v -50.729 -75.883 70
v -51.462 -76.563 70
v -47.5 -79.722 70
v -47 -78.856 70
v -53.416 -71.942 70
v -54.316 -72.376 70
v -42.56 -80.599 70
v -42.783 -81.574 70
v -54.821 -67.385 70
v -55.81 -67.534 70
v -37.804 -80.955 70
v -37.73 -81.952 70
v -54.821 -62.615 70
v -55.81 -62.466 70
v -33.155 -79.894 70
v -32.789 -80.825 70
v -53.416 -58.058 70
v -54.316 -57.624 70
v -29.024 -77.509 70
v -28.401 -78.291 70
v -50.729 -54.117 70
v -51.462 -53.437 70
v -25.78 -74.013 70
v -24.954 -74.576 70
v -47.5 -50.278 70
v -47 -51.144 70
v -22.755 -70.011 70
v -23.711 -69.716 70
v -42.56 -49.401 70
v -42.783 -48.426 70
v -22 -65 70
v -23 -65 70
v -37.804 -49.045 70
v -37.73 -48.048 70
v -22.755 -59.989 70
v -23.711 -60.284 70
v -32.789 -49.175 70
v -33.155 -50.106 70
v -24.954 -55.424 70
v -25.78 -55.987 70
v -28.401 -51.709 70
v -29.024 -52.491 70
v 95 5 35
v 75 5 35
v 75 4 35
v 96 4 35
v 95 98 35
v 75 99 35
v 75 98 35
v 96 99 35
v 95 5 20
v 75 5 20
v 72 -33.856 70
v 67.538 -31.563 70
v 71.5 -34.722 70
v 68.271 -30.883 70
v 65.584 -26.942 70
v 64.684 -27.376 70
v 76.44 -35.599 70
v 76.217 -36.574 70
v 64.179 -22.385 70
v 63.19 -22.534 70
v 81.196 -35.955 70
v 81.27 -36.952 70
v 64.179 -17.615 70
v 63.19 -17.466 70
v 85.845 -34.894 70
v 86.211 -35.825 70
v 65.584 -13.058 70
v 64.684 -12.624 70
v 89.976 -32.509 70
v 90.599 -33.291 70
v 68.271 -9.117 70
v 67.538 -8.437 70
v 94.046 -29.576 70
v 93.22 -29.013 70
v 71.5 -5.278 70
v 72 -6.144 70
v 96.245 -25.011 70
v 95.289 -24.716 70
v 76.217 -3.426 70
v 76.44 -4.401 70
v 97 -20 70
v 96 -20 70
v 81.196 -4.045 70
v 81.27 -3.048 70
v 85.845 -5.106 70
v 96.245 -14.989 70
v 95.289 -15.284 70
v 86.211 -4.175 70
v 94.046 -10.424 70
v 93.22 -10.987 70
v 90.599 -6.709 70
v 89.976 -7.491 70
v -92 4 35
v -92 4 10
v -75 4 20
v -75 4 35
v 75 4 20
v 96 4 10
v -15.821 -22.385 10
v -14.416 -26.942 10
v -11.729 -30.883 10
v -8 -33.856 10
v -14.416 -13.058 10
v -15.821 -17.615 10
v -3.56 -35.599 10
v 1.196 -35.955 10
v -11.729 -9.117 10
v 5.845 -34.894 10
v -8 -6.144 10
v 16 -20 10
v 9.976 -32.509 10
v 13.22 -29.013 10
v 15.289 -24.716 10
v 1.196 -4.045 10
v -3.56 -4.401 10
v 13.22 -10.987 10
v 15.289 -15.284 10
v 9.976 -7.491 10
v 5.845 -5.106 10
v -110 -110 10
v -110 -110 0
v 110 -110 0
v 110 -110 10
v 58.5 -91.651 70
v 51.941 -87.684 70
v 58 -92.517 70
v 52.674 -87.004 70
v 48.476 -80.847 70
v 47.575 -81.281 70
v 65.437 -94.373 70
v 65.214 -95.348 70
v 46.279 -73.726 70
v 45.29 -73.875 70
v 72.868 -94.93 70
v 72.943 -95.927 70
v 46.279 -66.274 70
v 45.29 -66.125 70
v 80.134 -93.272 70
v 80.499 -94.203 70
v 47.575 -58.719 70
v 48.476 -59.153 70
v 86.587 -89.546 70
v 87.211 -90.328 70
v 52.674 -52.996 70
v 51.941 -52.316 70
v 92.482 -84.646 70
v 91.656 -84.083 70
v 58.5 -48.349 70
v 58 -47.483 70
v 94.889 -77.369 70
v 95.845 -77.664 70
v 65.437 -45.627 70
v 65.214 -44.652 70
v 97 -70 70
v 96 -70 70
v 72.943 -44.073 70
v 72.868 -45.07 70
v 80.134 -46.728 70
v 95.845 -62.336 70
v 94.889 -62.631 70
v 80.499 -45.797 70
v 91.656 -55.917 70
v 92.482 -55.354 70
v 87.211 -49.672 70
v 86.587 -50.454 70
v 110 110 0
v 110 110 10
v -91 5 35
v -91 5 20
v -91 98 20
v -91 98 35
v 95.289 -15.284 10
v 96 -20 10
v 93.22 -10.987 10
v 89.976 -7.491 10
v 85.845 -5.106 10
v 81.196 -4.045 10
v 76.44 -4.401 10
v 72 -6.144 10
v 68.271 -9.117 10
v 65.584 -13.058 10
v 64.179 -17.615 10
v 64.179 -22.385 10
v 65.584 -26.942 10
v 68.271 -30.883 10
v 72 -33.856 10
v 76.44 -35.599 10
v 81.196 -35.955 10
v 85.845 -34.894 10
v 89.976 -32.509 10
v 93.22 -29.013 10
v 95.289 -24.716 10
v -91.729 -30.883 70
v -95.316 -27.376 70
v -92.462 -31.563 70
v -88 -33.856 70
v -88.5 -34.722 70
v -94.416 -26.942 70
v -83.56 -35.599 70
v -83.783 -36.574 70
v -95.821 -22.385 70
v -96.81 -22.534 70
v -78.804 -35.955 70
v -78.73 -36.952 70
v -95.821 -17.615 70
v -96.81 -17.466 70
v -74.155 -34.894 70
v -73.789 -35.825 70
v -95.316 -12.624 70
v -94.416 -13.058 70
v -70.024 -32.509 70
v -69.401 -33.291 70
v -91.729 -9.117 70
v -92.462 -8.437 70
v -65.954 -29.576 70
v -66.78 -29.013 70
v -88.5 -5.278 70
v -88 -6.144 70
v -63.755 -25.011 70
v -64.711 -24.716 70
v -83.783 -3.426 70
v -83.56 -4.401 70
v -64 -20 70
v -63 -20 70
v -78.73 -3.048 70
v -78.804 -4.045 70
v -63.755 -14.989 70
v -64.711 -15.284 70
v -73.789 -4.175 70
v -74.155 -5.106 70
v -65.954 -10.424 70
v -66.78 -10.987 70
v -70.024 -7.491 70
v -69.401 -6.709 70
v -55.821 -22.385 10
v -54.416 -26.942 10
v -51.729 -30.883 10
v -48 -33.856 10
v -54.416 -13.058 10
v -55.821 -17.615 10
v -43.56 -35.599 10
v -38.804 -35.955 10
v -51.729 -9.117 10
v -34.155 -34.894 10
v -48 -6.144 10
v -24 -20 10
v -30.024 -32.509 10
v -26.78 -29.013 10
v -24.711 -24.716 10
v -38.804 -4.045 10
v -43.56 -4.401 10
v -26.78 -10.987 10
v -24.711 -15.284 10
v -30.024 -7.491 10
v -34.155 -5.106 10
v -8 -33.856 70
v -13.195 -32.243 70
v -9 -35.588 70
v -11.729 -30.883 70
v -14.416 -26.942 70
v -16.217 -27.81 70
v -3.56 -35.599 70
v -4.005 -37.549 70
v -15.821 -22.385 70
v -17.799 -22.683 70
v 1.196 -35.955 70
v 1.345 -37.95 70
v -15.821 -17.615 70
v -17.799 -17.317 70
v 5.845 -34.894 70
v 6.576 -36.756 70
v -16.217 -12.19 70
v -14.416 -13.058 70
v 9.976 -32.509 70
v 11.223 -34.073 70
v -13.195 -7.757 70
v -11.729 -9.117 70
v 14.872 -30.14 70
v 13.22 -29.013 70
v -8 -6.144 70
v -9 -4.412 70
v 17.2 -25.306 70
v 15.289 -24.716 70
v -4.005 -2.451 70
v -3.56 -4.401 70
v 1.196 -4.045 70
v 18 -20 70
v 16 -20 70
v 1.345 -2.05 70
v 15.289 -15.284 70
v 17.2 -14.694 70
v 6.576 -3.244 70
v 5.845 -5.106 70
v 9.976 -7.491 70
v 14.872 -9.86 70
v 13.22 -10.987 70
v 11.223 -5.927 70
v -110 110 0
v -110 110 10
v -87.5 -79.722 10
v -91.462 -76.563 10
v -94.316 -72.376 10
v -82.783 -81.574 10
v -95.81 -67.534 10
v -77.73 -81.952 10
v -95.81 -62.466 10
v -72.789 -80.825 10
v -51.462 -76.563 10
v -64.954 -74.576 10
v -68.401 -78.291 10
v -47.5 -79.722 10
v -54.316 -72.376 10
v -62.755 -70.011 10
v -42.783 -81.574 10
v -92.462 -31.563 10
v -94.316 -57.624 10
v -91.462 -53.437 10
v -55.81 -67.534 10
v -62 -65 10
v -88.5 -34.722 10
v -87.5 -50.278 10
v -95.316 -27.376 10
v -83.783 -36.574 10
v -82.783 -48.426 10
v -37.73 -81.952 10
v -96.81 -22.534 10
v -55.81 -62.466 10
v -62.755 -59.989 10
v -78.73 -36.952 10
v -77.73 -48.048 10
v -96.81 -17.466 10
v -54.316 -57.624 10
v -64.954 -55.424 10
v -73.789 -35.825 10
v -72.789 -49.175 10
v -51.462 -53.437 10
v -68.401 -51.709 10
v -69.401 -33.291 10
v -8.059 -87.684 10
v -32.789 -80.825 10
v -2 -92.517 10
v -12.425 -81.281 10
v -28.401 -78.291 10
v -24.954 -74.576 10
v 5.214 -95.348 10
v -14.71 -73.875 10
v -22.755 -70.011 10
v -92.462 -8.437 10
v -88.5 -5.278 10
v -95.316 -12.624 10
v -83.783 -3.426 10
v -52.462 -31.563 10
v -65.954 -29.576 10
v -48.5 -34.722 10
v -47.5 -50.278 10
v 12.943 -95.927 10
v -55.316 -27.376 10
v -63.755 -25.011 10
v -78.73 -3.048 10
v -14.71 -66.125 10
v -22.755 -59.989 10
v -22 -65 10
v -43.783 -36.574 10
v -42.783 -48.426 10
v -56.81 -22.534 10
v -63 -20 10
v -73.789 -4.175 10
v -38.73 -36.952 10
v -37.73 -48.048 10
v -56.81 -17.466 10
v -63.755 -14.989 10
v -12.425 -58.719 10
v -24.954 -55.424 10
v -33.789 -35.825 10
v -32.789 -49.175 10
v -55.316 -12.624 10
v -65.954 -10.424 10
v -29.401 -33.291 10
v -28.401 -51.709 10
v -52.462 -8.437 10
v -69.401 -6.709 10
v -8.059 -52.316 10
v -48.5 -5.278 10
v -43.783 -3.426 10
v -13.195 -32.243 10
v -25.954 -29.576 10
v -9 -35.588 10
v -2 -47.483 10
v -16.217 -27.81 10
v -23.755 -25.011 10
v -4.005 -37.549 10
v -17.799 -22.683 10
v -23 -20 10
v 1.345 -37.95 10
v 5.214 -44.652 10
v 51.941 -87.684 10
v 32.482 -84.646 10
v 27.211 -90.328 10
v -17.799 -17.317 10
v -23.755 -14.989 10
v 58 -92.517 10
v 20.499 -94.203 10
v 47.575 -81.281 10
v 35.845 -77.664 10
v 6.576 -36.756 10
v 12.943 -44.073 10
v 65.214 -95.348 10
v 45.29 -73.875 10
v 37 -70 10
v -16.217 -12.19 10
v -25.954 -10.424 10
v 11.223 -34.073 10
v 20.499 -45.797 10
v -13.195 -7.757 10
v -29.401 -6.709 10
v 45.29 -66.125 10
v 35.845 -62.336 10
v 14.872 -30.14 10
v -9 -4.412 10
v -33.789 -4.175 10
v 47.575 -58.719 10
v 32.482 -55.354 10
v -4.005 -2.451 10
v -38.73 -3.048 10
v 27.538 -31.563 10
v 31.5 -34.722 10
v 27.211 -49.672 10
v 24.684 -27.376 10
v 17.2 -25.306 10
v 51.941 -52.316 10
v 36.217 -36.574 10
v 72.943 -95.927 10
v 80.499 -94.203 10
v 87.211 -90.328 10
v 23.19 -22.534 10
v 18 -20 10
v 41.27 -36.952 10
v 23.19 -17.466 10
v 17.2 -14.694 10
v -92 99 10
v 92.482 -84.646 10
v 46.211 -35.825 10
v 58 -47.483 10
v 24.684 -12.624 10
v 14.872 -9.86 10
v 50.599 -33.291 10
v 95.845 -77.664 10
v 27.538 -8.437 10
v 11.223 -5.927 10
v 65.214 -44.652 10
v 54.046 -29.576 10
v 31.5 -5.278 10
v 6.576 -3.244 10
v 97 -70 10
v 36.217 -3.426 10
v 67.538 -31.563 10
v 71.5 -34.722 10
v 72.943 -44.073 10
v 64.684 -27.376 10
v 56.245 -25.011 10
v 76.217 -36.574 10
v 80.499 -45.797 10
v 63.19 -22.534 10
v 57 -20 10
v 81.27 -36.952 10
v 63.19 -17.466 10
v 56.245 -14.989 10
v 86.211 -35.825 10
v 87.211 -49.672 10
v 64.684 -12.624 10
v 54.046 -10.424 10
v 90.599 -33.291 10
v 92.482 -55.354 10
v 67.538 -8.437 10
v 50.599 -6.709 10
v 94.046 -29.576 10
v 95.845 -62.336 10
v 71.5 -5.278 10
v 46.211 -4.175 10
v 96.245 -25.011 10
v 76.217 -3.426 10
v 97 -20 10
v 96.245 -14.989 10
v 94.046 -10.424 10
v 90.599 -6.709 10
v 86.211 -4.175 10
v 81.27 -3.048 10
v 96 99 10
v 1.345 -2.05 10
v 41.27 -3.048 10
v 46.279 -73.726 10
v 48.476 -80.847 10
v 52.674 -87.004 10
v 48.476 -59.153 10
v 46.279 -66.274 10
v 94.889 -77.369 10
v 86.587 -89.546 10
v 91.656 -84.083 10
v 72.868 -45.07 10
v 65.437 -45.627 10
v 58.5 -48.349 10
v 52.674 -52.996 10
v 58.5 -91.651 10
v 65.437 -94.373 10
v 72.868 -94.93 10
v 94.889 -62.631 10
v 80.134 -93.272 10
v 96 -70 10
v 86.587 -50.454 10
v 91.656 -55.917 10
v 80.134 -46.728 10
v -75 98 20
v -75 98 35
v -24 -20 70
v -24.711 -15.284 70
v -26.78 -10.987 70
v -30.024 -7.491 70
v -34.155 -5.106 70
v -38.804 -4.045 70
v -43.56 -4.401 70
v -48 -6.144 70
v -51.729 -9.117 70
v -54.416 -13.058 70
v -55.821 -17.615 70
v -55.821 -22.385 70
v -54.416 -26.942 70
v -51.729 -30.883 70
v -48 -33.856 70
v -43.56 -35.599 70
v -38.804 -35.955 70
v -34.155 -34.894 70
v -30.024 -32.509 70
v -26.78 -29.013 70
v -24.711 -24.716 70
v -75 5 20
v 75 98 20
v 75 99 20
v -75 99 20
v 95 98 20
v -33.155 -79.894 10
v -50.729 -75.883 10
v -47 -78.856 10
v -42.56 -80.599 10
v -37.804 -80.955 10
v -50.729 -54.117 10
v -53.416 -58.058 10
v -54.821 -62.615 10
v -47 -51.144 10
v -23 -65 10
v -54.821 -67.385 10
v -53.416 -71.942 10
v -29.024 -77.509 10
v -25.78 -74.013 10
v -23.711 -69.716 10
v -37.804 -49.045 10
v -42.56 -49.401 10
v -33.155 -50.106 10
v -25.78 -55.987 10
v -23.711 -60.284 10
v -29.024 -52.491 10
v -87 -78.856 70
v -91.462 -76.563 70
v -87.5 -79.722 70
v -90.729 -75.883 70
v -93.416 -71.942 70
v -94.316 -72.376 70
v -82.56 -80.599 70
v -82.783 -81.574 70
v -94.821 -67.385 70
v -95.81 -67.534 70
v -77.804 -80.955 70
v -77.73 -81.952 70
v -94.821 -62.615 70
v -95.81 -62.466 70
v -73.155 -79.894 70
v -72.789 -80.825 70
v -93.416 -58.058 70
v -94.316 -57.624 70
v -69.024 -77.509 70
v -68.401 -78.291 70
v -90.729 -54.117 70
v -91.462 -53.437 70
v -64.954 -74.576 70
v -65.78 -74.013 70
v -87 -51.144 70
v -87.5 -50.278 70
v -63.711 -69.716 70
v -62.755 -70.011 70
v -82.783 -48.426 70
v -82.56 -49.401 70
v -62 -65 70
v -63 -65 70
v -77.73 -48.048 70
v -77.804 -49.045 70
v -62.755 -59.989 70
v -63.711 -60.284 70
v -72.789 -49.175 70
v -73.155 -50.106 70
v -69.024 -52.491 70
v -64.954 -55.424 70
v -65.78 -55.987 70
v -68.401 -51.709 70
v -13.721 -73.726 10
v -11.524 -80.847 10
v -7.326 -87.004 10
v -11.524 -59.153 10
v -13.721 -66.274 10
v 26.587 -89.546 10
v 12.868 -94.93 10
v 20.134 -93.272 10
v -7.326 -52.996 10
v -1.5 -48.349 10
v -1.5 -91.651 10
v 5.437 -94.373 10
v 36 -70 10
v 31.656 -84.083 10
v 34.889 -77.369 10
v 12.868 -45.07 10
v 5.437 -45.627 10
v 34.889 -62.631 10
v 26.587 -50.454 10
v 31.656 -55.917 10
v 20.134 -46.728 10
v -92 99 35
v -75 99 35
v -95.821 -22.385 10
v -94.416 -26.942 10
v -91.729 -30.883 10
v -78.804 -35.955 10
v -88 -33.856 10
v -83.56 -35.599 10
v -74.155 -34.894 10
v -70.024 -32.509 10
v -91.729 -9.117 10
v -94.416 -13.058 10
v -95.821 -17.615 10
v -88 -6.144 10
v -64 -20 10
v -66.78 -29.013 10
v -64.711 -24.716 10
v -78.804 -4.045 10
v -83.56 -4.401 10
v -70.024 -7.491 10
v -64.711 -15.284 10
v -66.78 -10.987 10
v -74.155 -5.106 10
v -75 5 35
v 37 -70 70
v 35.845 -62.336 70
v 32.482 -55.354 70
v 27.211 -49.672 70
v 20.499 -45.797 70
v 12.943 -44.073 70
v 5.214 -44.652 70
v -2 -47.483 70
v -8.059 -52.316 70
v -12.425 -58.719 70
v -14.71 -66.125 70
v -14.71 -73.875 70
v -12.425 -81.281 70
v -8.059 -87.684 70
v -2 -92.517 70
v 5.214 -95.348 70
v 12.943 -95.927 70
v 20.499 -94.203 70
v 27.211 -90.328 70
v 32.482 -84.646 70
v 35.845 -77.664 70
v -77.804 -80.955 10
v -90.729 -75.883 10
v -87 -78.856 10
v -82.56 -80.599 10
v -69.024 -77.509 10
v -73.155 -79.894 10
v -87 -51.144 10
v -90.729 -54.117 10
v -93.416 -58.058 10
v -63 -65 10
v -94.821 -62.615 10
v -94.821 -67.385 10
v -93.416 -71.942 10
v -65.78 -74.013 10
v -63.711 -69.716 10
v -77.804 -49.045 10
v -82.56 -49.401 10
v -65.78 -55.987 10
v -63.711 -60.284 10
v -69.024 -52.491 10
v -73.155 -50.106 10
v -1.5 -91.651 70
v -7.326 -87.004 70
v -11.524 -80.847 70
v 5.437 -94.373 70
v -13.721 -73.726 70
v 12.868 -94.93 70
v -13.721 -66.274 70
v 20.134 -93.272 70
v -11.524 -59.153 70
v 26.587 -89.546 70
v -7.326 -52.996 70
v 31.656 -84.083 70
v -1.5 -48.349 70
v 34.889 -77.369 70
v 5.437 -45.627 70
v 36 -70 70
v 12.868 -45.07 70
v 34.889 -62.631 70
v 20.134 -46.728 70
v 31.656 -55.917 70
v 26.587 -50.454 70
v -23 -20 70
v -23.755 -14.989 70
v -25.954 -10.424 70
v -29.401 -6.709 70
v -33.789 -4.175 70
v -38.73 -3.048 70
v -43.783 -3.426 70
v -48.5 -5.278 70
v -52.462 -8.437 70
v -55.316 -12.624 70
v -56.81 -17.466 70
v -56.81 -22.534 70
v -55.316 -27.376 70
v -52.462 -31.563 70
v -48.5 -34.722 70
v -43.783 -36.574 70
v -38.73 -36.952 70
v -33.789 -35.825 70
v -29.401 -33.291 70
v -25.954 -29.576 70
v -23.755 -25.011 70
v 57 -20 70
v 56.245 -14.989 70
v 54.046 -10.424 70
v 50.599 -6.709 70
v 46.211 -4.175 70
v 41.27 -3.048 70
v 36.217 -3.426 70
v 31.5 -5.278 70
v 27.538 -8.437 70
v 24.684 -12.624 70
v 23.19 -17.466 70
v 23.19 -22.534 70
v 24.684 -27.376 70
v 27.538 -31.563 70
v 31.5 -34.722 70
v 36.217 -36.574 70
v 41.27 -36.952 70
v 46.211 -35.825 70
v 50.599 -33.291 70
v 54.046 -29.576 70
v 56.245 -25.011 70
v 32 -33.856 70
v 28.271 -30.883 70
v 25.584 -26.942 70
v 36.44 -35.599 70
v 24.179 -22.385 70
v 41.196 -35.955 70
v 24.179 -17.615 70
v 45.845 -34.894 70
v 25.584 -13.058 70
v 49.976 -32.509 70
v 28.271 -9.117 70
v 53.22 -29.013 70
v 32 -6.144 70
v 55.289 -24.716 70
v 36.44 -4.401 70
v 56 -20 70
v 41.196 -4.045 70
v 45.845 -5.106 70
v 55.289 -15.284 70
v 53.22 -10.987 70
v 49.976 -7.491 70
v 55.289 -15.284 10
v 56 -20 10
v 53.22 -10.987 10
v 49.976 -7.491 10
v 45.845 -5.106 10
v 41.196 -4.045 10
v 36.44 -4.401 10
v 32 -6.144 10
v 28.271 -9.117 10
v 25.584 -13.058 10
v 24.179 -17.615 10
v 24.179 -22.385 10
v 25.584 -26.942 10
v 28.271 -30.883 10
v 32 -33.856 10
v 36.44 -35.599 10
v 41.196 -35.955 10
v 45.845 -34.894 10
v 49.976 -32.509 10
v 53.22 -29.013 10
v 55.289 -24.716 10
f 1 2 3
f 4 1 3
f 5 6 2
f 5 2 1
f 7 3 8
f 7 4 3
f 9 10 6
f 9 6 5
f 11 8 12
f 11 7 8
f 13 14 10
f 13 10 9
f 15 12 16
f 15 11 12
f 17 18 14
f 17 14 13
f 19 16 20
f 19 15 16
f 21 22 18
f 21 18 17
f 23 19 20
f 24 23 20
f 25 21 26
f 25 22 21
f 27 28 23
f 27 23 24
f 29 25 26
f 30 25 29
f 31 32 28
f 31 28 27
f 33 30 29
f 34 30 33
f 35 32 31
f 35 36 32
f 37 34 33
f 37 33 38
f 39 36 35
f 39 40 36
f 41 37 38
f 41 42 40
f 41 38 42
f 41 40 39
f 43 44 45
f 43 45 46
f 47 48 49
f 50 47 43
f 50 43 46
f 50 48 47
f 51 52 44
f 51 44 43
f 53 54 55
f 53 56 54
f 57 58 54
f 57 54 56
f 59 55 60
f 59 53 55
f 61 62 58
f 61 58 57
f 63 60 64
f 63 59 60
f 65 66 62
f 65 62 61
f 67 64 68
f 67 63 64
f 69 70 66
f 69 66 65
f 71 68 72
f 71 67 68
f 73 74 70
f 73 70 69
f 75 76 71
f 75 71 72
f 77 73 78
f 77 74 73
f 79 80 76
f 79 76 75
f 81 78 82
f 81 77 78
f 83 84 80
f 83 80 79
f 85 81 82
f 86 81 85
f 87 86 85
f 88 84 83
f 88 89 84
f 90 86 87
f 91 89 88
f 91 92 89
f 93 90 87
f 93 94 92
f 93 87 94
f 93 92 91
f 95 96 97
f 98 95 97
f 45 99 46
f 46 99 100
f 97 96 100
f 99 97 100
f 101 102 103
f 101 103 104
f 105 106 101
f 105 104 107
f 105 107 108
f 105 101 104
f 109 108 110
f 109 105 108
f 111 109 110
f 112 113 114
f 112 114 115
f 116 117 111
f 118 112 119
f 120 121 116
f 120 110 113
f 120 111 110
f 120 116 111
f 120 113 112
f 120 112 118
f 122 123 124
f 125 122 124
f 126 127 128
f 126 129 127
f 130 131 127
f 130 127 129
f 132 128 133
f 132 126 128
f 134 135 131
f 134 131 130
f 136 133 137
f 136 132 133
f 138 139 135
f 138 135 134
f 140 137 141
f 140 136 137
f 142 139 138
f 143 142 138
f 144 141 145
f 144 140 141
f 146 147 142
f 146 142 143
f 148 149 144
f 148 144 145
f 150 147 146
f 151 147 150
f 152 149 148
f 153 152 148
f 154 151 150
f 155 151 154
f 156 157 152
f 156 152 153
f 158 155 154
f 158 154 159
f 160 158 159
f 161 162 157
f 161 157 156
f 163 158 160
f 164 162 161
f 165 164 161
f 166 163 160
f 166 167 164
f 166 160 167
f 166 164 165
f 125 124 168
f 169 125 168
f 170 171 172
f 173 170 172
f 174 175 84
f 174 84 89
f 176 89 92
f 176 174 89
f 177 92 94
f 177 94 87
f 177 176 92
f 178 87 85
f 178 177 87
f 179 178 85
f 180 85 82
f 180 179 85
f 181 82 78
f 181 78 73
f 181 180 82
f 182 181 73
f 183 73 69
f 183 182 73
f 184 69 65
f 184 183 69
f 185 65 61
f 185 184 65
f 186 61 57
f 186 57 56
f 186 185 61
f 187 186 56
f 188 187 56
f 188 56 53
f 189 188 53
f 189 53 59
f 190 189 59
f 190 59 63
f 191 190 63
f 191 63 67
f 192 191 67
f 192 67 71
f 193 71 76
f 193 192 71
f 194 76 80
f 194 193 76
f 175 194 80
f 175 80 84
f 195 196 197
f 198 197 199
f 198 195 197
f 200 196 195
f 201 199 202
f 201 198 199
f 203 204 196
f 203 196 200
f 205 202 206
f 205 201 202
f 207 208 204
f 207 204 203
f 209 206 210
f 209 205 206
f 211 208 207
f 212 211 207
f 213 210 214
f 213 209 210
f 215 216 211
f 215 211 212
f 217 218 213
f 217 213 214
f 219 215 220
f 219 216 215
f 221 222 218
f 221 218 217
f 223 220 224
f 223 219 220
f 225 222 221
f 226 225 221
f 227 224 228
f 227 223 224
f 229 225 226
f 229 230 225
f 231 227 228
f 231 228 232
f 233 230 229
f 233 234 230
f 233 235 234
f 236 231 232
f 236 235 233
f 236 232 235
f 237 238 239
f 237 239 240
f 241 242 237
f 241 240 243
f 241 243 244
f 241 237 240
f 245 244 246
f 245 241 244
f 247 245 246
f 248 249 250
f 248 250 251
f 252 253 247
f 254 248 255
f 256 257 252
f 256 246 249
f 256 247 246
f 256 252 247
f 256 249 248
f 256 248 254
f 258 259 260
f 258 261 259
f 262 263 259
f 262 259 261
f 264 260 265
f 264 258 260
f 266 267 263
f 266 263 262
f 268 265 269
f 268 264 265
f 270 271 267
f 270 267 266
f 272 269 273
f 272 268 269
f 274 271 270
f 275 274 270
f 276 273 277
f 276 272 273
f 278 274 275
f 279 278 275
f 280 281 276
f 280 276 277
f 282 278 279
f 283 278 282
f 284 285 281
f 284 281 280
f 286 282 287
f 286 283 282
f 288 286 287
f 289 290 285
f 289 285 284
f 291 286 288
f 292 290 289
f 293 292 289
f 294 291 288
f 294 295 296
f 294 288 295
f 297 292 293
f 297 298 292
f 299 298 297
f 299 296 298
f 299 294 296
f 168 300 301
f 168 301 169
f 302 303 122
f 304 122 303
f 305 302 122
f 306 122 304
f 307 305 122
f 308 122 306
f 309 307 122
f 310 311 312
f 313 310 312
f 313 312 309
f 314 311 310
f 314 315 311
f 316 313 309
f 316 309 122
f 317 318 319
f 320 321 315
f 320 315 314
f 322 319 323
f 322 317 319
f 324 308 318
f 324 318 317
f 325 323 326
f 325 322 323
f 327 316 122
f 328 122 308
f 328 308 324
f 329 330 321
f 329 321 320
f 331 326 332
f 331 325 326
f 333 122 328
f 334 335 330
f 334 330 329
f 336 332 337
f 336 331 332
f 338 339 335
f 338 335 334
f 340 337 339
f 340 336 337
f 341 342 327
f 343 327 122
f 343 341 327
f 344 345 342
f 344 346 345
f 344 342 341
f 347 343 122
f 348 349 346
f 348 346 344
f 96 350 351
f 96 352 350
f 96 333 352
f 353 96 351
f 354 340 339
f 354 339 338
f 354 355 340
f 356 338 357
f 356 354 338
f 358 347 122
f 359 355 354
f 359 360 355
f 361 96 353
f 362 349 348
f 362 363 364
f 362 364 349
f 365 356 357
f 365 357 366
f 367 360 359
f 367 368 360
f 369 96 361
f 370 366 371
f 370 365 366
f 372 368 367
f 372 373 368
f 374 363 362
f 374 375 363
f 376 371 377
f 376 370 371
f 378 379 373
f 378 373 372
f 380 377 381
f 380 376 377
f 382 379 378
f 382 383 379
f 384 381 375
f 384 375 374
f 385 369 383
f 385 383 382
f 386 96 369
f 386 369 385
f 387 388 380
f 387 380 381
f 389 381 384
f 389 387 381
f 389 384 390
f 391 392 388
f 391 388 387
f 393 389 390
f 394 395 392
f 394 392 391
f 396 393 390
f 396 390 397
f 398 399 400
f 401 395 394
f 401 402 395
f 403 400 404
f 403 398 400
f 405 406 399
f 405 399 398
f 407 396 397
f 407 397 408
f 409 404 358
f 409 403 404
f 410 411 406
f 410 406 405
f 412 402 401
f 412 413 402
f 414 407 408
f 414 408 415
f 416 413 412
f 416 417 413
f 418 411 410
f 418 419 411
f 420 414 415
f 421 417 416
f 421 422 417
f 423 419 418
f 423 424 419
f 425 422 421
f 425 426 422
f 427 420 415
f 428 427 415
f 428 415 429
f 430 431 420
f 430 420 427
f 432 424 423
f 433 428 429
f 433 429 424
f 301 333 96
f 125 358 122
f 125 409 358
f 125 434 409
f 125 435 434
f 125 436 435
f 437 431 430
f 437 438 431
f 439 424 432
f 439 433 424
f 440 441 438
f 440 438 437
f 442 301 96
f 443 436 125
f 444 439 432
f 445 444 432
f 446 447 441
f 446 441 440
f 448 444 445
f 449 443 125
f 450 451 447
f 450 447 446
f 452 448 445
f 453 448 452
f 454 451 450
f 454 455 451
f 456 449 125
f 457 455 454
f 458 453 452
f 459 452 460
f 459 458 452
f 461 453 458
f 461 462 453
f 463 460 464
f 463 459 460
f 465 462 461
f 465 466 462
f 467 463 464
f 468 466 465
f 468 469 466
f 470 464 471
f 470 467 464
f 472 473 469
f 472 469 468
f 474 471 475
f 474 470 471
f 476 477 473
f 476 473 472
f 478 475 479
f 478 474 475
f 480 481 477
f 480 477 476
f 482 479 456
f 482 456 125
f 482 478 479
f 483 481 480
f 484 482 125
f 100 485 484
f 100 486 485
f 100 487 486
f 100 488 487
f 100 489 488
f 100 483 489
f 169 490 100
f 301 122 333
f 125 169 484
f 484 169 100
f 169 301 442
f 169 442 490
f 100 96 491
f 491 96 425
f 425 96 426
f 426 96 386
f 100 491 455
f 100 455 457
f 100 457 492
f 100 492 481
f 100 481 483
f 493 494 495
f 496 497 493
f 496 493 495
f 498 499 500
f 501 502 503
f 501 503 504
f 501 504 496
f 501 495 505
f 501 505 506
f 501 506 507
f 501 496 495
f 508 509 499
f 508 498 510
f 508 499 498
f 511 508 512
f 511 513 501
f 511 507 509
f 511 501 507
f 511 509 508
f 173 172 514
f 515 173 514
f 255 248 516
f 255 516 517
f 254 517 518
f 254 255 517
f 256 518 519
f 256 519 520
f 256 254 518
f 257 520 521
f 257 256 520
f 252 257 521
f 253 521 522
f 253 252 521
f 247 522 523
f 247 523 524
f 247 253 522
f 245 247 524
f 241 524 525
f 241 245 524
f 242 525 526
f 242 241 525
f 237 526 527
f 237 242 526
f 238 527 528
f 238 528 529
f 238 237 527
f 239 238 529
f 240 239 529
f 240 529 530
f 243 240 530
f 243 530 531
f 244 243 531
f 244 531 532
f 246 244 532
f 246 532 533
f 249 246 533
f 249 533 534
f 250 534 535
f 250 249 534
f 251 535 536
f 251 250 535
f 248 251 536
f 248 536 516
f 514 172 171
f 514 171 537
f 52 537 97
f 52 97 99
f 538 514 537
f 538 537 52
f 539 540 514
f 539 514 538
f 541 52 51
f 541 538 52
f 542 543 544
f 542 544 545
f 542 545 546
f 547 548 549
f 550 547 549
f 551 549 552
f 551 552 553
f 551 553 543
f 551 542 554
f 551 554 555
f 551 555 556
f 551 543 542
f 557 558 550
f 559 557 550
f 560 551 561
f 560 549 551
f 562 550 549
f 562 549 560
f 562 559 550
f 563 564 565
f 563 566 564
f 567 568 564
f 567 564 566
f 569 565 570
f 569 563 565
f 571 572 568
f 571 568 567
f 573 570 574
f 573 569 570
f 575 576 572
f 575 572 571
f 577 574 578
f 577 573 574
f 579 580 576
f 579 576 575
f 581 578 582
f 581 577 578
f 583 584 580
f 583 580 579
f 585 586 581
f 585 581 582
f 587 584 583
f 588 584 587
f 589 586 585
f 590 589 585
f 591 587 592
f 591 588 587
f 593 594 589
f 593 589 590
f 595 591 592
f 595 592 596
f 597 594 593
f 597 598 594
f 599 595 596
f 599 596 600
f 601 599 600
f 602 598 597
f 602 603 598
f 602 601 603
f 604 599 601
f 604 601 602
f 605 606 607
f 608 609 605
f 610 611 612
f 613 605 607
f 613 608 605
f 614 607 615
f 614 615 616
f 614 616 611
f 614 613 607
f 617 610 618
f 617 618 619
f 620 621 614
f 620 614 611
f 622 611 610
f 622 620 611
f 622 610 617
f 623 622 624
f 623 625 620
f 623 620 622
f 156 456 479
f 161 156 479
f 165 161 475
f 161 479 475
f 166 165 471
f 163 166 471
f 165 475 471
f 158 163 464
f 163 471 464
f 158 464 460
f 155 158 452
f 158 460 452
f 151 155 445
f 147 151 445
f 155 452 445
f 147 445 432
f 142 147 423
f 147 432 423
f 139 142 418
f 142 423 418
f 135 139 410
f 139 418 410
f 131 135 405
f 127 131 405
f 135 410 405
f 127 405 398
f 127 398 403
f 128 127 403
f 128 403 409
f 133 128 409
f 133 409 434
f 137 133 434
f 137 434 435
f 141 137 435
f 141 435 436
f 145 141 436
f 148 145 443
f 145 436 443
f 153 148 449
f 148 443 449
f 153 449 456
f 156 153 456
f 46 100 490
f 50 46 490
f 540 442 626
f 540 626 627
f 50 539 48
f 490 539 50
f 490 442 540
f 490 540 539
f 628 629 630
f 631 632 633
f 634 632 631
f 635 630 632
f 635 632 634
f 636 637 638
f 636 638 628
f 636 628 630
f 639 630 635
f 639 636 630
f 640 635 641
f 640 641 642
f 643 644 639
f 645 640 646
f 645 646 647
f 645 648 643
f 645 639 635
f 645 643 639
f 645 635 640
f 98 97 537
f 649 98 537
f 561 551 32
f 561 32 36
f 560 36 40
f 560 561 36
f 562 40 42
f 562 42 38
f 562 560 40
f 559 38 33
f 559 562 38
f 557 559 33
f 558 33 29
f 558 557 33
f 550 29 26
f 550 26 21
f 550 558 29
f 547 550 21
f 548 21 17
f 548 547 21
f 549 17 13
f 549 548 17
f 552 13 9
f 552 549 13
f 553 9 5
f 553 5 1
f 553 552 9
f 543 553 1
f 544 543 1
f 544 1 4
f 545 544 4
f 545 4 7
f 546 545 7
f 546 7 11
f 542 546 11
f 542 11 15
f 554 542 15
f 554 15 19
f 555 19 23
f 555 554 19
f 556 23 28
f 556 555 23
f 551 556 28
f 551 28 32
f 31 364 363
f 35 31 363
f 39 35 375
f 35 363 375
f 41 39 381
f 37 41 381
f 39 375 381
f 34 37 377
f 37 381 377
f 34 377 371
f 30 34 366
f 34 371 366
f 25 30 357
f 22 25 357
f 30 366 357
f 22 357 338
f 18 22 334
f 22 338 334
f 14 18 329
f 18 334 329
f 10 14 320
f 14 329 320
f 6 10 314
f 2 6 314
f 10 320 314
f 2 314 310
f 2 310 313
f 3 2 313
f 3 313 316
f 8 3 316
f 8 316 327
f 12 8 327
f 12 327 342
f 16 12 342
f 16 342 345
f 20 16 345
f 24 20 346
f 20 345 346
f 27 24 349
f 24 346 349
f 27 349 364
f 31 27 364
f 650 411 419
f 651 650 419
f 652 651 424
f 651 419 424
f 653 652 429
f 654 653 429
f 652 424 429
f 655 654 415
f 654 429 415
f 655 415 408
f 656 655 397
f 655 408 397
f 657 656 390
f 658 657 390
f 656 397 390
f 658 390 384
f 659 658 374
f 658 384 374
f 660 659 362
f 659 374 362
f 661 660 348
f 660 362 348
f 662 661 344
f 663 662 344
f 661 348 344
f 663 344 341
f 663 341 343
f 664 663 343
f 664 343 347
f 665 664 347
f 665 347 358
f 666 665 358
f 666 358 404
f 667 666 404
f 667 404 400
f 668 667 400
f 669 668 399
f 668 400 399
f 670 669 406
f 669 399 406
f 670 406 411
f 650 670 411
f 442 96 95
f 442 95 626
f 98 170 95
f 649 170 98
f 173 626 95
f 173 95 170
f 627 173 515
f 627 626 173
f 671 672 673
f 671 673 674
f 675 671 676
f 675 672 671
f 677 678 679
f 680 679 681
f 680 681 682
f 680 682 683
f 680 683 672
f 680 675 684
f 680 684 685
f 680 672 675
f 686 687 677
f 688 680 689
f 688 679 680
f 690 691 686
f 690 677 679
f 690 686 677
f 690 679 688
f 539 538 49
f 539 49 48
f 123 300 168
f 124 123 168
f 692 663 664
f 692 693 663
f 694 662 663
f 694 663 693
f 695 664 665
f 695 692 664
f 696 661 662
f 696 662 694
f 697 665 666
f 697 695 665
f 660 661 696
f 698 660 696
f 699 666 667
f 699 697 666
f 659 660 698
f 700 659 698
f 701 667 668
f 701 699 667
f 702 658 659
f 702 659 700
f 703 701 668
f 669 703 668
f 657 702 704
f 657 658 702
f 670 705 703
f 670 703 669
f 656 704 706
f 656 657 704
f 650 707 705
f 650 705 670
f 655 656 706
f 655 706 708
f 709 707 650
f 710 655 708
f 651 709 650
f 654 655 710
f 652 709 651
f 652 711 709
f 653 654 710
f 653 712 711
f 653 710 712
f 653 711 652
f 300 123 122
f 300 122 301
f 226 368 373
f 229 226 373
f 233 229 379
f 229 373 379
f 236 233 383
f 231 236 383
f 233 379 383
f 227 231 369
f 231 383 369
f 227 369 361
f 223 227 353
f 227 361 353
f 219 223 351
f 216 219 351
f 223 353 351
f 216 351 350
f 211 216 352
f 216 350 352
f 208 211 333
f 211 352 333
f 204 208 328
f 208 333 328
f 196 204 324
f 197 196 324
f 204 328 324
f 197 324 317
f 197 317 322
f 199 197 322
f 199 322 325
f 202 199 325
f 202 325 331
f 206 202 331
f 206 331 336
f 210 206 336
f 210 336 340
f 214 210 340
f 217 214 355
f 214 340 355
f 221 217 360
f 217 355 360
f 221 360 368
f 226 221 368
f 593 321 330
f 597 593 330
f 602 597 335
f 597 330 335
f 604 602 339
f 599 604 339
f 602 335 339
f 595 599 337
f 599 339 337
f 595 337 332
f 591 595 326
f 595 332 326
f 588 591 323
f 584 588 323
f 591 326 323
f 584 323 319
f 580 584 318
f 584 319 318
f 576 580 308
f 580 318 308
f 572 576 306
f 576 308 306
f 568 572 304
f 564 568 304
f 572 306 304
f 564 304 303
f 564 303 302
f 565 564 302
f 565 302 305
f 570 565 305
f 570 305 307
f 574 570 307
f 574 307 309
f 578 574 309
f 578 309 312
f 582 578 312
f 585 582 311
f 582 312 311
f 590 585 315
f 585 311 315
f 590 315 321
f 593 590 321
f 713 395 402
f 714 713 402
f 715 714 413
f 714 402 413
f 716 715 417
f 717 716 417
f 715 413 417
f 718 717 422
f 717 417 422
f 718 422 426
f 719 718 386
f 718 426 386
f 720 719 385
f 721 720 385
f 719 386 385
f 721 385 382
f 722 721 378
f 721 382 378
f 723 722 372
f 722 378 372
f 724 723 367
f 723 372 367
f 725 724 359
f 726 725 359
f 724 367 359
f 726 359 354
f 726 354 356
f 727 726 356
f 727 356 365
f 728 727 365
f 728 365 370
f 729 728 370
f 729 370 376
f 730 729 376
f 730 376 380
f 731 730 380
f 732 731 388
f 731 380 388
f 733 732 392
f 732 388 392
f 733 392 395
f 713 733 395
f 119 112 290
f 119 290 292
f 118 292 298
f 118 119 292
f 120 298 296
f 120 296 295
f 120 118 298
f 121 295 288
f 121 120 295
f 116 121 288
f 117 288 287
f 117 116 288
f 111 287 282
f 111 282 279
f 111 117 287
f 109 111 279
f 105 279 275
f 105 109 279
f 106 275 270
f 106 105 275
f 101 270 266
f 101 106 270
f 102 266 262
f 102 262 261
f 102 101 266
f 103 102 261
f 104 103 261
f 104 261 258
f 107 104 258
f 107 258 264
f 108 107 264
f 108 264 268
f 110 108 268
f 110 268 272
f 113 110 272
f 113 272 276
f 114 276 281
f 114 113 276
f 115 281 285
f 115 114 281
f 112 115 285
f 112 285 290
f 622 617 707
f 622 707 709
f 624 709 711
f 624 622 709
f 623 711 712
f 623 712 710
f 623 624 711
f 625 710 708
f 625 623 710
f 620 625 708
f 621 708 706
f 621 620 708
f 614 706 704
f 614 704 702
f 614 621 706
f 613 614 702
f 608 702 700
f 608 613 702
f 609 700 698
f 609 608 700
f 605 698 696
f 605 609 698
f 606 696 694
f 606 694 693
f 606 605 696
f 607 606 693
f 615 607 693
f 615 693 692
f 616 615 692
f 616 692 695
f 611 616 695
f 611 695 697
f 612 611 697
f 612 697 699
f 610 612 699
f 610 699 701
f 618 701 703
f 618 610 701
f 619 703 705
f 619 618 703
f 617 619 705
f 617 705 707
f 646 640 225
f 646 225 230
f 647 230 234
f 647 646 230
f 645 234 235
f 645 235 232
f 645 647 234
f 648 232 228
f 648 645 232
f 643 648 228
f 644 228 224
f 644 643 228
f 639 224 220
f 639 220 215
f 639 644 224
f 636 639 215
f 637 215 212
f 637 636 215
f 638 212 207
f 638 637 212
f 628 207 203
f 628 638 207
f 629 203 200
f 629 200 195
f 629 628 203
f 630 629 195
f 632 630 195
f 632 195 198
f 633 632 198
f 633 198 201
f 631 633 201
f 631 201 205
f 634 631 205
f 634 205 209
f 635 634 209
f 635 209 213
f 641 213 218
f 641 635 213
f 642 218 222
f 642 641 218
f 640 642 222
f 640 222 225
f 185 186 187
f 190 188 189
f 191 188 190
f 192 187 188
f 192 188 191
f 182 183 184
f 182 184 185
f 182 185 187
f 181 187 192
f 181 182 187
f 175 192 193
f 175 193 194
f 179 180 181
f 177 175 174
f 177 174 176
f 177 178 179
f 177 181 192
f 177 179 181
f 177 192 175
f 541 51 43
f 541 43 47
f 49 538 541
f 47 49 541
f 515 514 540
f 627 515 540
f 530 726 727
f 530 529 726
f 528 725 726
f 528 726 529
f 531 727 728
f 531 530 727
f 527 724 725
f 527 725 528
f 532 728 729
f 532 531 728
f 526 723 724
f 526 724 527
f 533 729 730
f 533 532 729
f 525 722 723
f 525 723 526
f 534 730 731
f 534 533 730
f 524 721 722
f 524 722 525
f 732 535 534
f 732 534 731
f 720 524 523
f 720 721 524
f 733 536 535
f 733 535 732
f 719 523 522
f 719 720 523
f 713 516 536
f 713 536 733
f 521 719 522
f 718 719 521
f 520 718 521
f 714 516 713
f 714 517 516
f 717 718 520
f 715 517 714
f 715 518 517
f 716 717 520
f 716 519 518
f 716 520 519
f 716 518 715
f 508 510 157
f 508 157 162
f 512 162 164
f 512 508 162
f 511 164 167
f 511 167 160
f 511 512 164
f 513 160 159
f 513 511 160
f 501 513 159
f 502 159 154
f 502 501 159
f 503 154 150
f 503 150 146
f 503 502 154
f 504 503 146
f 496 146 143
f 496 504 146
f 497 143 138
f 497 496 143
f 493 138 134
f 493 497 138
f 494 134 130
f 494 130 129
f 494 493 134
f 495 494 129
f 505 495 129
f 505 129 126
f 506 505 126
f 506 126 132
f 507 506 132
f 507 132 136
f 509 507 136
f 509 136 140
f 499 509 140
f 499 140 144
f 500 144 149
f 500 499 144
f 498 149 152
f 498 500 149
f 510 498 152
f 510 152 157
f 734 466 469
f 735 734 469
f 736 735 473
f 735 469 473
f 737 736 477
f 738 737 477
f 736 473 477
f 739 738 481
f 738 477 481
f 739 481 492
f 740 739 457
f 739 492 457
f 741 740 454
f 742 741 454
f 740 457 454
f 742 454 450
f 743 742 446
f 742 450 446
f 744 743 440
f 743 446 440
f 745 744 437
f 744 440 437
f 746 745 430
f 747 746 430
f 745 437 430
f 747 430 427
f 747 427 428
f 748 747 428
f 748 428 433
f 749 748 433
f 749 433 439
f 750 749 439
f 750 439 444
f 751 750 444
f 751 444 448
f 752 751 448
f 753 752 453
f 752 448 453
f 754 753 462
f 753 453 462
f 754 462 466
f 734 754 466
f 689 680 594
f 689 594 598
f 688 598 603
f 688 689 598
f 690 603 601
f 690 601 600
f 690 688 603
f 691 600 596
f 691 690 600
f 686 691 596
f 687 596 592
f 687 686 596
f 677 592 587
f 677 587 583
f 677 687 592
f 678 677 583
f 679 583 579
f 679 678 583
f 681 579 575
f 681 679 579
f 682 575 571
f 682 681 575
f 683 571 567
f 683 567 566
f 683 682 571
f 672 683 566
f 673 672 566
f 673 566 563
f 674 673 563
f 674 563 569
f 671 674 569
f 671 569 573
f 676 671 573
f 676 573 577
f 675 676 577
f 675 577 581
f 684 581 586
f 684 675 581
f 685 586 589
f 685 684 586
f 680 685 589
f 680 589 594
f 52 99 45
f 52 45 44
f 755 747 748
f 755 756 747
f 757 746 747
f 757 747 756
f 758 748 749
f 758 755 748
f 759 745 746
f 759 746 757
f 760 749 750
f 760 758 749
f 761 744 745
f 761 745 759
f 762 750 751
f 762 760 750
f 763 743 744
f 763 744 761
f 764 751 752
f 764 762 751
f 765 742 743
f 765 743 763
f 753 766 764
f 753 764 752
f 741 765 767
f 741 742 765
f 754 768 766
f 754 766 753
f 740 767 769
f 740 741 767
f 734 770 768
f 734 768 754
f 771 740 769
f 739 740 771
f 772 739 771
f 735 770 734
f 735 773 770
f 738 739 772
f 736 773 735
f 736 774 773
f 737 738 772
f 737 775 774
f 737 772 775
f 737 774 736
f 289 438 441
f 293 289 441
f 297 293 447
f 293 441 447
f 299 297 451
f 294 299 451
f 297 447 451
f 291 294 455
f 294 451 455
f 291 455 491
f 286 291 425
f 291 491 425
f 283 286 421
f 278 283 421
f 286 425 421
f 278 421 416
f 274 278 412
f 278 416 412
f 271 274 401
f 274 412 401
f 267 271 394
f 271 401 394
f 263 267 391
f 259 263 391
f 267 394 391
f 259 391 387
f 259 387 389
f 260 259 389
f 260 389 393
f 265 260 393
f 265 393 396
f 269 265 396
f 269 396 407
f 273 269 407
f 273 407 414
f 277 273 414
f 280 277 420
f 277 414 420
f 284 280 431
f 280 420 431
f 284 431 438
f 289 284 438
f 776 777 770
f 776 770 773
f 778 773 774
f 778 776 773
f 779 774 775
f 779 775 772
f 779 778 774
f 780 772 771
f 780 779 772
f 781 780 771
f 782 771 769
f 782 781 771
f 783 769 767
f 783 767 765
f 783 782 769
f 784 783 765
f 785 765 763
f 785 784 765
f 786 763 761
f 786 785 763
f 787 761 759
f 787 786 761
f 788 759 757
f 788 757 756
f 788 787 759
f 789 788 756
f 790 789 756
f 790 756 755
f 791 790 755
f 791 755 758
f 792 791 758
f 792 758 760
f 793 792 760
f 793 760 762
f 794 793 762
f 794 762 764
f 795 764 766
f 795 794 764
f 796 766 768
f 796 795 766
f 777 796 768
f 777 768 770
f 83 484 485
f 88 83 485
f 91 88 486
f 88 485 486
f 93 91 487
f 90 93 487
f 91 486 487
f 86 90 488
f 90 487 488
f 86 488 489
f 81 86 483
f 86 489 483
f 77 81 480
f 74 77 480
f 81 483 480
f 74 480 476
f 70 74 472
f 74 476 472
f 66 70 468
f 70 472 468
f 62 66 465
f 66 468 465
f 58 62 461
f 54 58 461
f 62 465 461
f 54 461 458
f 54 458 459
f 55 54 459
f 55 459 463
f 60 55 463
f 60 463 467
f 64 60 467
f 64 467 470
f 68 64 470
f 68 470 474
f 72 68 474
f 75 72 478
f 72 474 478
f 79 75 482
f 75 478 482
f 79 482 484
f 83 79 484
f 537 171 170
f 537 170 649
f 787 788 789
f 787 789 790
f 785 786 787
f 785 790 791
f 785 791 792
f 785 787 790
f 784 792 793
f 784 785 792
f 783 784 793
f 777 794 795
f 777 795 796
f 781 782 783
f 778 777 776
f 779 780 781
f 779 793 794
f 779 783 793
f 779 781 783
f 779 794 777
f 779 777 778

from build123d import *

# Parameters (mm, degrees)
SKETCH_W          = 220
SKETCH_H          = 220
PAD_DEPTH         = 10
BOX_W             = 188
BOX_H             = 95
BOX_DEPTH         = 25
BOX001_W          = 186
BOX001_H          = 93
BOX001_DEPTH      = 20
BOX002_W          = 150
BOX002_H          = 95
BOX002_DEPTH      = 20
CYLINDER_R        = 18
CYLINDER_DEPTH    = 60
CYLINDER001_R     = 17
CYLINDER001_DEPTH = 60
CYLINDER002_R     = 16
CYLINDER002_DEPTH = 60
CYLINDER003_R     = 17
CYLINDER003_DEPTH = 60
CYLINDER004_R     = 16
CYLINDER004_DEPTH = 60
CYLINDER005_R     = 17
CYLINDER005_DEPTH = 60
CYLINDER006_R     = 16
CYLINDER006_DEPTH = 60
CYLINDER007_R     = 17
CYLINDER007_DEPTH = 60
CYLINDER008_R     = 16
CYLINDER008_DEPTH = 60
CYLINDER009_R     = 16
CYLINDER009_DEPTH = 60
CYLINDER010_R     = 17
CYLINDER010_DEPTH = 60
CYLINDER011_R     = 16
CYLINDER011_DEPTH = 60
CYLINDER012_R     = 17
CYLINDER012_DEPTH = 60
CYLINDER013_R     = 16
CYLINDER013_DEPTH = 60
CYLINDER014_R     = 26
CYLINDER014_DEPTH = 60
CYLINDER015_R     = 25
CYLINDER015_DEPTH = 60
CYLINDER016_R     = 26
CYLINDER016_DEPTH = 60
CYLINDER017_R     = 25
CYLINDER017_DEPTH = 60


with BuildPart() as part:
    # Sketch → Pad (new body)
    with BuildSketch(Plane.XY):
        Rectangle(SKETCH_W, SKETCH_H)
    extrude(amount=PAD_DEPTH)

    # Box → Box (join)
    with BuildSketch(Plane(origin=(-92, 4, 10), x_dir=(1, 0, 0), z_dir=(0, 0, 1))):
        with Locations((94, 47.5)):
            Rectangle(BOX_W, BOX_H)
    extrude(amount=BOX_DEPTH)

    # Box001 → Box001 (cut)
    with BuildSketch(Plane(origin=(-91, 5, 20), x_dir=(1, 0, 0), z_dir=(0, 0, 1))):
        with Locations((93, 46.5)):
            Rectangle(BOX001_W, BOX001_H)
    extrude(amount=BOX001_DEPTH, mode=Mode.SUBTRACT)

    # Box002 → Box002 (cut)
    with BuildSketch(Plane(origin=(-75, 4, 20), x_dir=(1, 0, 0), z_dir=(0, 0, 1))):
        with Locations((75, 47.5)):
            Rectangle(BOX002_W, BOX002_H)
    extrude(amount=BOX002_DEPTH, mode=Mode.SUBTRACT)

    # Cylinder → Cylinder (join)
    with BuildSketch(Plane(origin=(0, -20, 10), x_dir=(1, 0, 0), z_dir=(0, 0, 1))):
        Circle(CYLINDER_R)
    extrude(amount=CYLINDER_DEPTH)

    # Cylinder001 → Cylinder001 (join)
    with BuildSketch(Plane(origin=(40, -20, 10), x_dir=(1, 0, 0), z_dir=(0, 0, 1))):
        Circle(CYLINDER001_R)
    extrude(amount=CYLINDER001_DEPTH)

    # Cylinder002 → Cylinder002 (cut)
    with BuildSketch(Plane(origin=(40, -20, 10), x_dir=(1, 0, 0), z_dir=(0, 0, 1))):
        Circle(CYLINDER002_R)
    extrude(amount=CYLINDER002_DEPTH, mode=Mode.SUBTRACT)

    # Cylinder003 → Cylinder003 (join)
    with BuildSketch(Plane(origin=(80, -20, 10), x_dir=(1, 0, 0), z_dir=(0, 0, 1))):
        Circle(CYLINDER003_R)
    extrude(amount=CYLINDER003_DEPTH)

    # Cylinder004 → Cylinder004 (cut)
    with BuildSketch(Plane(origin=(80, -20, 10), x_dir=(1, 0, 0), z_dir=(0, 0, 1))):
        Circle(CYLINDER004_R)
    extrude(amount=CYLINDER004_DEPTH, mode=Mode.SUBTRACT)

    # Cylinder005 → Cylinder005 (join)
    with BuildSketch(Plane(origin=(-40, -20, 10), x_dir=(1, 0, 0), z_dir=(0, 0, 1))):
        Circle(CYLINDER005_R)
    extrude(amount=CYLINDER005_DEPTH)

    # Cylinder006 → Cylinder006 (cut)
    with BuildSketch(Plane(origin=(-40, -20, 10), x_dir=(1, 0, 0), z_dir=(0, 0, 1))):
        Circle(CYLINDER006_R)
    extrude(amount=CYLINDER006_DEPTH, mode=Mode.SUBTRACT)

    # Cylinder007 → Cylinder007 (join)
    with BuildSketch(Plane(origin=(-80, -20, 10), x_dir=(1, 0, 0), z_dir=(0, 0, 1))):
        Circle(CYLINDER007_R)
    extrude(amount=CYLINDER007_DEPTH)

    # Cylinder008 → Cylinder008 (cut)
    with BuildSketch(Plane(origin=(-80, -20, 10), x_dir=(1, 0, 0), z_dir=(0, 0, 1))):
        Circle(CYLINDER008_R)
    extrude(amount=CYLINDER008_DEPTH, mode=Mode.SUBTRACT)

    # Cylinder009 → Cylinder009 (cut)
    with BuildSketch(Plane(origin=(0, -20, 10), x_dir=(1, 0, 0), z_dir=(0, 0, 1))):
        Circle(CYLINDER009_R)
    extrude(amount=CYLINDER009_DEPTH, mode=Mode.SUBTRACT)

    # Cylinder010 → Cylinder010 (join)
    with BuildSketch(Plane(origin=(-79, -65, 10), x_dir=(1, 0, 0), z_dir=(0, 0, 1))):
        Circle(CYLINDER010_R)
    extrude(amount=CYLINDER010_DEPTH)

    # Cylinder011 → Cylinder011 (cut)
    with BuildSketch(Plane(origin=(-79, -65, 10), x_dir=(1, 0, 0), z_dir=(0, 0, 1))):
        Circle(CYLINDER011_R)
    extrude(amount=CYLINDER011_DEPTH, mode=Mode.SUBTRACT)

    # Cylinder012 → Cylinder012 (join)
    with BuildSketch(Plane(origin=(-39, -65, 10), x_dir=(1, 0, 0), z_dir=(0, 0, 1))):
        Circle(CYLINDER012_R)
    extrude(amount=CYLINDER012_DEPTH)

    # Cylinder013 → Cylinder013 (cut)
    with BuildSketch(Plane(origin=(-39, -65, 10), x_dir=(1, 0, 0), z_dir=(0, 0, 1))):
        Circle(CYLINDER013_R)
    extrude(amount=CYLINDER013_DEPTH, mode=Mode.SUBTRACT)

    # Cylinder014 → Cylinder014 (join)
    with BuildSketch(Plane(origin=(11, -70, 10), x_dir=(1, 0, 0), z_dir=(0, 0, 1))):
        Circle(CYLINDER014_R)
    extrude(amount=CYLINDER014_DEPTH)

    # Cylinder015 → Cylinder015 (cut)
    with BuildSketch(Plane(origin=(11, -70, 10), x_dir=(1, 0, 0), z_dir=(0, 0, 1))):
        Circle(CYLINDER015_R)
    extrude(amount=CYLINDER015_DEPTH, mode=Mode.SUBTRACT)

    # Cylinder016 → Cylinder016 (join)
    with BuildSketch(Plane(origin=(71, -70, 10), x_dir=(1, 0, 0), z_dir=(0, 0, 1))):
        Circle(CYLINDER016_R)
    extrude(amount=CYLINDER016_DEPTH)

    # Cylinder017 → Cylinder017 (cut)
    with BuildSketch(Plane(origin=(71, -70, 10), x_dir=(1, 0, 0), z_dir=(0, 0, 1))):
        Circle(CYLINDER017_R)
    extrude(amount=CYLINDER017_DEPTH, mode=Mode.SUBTRACT)


solid = part.part
